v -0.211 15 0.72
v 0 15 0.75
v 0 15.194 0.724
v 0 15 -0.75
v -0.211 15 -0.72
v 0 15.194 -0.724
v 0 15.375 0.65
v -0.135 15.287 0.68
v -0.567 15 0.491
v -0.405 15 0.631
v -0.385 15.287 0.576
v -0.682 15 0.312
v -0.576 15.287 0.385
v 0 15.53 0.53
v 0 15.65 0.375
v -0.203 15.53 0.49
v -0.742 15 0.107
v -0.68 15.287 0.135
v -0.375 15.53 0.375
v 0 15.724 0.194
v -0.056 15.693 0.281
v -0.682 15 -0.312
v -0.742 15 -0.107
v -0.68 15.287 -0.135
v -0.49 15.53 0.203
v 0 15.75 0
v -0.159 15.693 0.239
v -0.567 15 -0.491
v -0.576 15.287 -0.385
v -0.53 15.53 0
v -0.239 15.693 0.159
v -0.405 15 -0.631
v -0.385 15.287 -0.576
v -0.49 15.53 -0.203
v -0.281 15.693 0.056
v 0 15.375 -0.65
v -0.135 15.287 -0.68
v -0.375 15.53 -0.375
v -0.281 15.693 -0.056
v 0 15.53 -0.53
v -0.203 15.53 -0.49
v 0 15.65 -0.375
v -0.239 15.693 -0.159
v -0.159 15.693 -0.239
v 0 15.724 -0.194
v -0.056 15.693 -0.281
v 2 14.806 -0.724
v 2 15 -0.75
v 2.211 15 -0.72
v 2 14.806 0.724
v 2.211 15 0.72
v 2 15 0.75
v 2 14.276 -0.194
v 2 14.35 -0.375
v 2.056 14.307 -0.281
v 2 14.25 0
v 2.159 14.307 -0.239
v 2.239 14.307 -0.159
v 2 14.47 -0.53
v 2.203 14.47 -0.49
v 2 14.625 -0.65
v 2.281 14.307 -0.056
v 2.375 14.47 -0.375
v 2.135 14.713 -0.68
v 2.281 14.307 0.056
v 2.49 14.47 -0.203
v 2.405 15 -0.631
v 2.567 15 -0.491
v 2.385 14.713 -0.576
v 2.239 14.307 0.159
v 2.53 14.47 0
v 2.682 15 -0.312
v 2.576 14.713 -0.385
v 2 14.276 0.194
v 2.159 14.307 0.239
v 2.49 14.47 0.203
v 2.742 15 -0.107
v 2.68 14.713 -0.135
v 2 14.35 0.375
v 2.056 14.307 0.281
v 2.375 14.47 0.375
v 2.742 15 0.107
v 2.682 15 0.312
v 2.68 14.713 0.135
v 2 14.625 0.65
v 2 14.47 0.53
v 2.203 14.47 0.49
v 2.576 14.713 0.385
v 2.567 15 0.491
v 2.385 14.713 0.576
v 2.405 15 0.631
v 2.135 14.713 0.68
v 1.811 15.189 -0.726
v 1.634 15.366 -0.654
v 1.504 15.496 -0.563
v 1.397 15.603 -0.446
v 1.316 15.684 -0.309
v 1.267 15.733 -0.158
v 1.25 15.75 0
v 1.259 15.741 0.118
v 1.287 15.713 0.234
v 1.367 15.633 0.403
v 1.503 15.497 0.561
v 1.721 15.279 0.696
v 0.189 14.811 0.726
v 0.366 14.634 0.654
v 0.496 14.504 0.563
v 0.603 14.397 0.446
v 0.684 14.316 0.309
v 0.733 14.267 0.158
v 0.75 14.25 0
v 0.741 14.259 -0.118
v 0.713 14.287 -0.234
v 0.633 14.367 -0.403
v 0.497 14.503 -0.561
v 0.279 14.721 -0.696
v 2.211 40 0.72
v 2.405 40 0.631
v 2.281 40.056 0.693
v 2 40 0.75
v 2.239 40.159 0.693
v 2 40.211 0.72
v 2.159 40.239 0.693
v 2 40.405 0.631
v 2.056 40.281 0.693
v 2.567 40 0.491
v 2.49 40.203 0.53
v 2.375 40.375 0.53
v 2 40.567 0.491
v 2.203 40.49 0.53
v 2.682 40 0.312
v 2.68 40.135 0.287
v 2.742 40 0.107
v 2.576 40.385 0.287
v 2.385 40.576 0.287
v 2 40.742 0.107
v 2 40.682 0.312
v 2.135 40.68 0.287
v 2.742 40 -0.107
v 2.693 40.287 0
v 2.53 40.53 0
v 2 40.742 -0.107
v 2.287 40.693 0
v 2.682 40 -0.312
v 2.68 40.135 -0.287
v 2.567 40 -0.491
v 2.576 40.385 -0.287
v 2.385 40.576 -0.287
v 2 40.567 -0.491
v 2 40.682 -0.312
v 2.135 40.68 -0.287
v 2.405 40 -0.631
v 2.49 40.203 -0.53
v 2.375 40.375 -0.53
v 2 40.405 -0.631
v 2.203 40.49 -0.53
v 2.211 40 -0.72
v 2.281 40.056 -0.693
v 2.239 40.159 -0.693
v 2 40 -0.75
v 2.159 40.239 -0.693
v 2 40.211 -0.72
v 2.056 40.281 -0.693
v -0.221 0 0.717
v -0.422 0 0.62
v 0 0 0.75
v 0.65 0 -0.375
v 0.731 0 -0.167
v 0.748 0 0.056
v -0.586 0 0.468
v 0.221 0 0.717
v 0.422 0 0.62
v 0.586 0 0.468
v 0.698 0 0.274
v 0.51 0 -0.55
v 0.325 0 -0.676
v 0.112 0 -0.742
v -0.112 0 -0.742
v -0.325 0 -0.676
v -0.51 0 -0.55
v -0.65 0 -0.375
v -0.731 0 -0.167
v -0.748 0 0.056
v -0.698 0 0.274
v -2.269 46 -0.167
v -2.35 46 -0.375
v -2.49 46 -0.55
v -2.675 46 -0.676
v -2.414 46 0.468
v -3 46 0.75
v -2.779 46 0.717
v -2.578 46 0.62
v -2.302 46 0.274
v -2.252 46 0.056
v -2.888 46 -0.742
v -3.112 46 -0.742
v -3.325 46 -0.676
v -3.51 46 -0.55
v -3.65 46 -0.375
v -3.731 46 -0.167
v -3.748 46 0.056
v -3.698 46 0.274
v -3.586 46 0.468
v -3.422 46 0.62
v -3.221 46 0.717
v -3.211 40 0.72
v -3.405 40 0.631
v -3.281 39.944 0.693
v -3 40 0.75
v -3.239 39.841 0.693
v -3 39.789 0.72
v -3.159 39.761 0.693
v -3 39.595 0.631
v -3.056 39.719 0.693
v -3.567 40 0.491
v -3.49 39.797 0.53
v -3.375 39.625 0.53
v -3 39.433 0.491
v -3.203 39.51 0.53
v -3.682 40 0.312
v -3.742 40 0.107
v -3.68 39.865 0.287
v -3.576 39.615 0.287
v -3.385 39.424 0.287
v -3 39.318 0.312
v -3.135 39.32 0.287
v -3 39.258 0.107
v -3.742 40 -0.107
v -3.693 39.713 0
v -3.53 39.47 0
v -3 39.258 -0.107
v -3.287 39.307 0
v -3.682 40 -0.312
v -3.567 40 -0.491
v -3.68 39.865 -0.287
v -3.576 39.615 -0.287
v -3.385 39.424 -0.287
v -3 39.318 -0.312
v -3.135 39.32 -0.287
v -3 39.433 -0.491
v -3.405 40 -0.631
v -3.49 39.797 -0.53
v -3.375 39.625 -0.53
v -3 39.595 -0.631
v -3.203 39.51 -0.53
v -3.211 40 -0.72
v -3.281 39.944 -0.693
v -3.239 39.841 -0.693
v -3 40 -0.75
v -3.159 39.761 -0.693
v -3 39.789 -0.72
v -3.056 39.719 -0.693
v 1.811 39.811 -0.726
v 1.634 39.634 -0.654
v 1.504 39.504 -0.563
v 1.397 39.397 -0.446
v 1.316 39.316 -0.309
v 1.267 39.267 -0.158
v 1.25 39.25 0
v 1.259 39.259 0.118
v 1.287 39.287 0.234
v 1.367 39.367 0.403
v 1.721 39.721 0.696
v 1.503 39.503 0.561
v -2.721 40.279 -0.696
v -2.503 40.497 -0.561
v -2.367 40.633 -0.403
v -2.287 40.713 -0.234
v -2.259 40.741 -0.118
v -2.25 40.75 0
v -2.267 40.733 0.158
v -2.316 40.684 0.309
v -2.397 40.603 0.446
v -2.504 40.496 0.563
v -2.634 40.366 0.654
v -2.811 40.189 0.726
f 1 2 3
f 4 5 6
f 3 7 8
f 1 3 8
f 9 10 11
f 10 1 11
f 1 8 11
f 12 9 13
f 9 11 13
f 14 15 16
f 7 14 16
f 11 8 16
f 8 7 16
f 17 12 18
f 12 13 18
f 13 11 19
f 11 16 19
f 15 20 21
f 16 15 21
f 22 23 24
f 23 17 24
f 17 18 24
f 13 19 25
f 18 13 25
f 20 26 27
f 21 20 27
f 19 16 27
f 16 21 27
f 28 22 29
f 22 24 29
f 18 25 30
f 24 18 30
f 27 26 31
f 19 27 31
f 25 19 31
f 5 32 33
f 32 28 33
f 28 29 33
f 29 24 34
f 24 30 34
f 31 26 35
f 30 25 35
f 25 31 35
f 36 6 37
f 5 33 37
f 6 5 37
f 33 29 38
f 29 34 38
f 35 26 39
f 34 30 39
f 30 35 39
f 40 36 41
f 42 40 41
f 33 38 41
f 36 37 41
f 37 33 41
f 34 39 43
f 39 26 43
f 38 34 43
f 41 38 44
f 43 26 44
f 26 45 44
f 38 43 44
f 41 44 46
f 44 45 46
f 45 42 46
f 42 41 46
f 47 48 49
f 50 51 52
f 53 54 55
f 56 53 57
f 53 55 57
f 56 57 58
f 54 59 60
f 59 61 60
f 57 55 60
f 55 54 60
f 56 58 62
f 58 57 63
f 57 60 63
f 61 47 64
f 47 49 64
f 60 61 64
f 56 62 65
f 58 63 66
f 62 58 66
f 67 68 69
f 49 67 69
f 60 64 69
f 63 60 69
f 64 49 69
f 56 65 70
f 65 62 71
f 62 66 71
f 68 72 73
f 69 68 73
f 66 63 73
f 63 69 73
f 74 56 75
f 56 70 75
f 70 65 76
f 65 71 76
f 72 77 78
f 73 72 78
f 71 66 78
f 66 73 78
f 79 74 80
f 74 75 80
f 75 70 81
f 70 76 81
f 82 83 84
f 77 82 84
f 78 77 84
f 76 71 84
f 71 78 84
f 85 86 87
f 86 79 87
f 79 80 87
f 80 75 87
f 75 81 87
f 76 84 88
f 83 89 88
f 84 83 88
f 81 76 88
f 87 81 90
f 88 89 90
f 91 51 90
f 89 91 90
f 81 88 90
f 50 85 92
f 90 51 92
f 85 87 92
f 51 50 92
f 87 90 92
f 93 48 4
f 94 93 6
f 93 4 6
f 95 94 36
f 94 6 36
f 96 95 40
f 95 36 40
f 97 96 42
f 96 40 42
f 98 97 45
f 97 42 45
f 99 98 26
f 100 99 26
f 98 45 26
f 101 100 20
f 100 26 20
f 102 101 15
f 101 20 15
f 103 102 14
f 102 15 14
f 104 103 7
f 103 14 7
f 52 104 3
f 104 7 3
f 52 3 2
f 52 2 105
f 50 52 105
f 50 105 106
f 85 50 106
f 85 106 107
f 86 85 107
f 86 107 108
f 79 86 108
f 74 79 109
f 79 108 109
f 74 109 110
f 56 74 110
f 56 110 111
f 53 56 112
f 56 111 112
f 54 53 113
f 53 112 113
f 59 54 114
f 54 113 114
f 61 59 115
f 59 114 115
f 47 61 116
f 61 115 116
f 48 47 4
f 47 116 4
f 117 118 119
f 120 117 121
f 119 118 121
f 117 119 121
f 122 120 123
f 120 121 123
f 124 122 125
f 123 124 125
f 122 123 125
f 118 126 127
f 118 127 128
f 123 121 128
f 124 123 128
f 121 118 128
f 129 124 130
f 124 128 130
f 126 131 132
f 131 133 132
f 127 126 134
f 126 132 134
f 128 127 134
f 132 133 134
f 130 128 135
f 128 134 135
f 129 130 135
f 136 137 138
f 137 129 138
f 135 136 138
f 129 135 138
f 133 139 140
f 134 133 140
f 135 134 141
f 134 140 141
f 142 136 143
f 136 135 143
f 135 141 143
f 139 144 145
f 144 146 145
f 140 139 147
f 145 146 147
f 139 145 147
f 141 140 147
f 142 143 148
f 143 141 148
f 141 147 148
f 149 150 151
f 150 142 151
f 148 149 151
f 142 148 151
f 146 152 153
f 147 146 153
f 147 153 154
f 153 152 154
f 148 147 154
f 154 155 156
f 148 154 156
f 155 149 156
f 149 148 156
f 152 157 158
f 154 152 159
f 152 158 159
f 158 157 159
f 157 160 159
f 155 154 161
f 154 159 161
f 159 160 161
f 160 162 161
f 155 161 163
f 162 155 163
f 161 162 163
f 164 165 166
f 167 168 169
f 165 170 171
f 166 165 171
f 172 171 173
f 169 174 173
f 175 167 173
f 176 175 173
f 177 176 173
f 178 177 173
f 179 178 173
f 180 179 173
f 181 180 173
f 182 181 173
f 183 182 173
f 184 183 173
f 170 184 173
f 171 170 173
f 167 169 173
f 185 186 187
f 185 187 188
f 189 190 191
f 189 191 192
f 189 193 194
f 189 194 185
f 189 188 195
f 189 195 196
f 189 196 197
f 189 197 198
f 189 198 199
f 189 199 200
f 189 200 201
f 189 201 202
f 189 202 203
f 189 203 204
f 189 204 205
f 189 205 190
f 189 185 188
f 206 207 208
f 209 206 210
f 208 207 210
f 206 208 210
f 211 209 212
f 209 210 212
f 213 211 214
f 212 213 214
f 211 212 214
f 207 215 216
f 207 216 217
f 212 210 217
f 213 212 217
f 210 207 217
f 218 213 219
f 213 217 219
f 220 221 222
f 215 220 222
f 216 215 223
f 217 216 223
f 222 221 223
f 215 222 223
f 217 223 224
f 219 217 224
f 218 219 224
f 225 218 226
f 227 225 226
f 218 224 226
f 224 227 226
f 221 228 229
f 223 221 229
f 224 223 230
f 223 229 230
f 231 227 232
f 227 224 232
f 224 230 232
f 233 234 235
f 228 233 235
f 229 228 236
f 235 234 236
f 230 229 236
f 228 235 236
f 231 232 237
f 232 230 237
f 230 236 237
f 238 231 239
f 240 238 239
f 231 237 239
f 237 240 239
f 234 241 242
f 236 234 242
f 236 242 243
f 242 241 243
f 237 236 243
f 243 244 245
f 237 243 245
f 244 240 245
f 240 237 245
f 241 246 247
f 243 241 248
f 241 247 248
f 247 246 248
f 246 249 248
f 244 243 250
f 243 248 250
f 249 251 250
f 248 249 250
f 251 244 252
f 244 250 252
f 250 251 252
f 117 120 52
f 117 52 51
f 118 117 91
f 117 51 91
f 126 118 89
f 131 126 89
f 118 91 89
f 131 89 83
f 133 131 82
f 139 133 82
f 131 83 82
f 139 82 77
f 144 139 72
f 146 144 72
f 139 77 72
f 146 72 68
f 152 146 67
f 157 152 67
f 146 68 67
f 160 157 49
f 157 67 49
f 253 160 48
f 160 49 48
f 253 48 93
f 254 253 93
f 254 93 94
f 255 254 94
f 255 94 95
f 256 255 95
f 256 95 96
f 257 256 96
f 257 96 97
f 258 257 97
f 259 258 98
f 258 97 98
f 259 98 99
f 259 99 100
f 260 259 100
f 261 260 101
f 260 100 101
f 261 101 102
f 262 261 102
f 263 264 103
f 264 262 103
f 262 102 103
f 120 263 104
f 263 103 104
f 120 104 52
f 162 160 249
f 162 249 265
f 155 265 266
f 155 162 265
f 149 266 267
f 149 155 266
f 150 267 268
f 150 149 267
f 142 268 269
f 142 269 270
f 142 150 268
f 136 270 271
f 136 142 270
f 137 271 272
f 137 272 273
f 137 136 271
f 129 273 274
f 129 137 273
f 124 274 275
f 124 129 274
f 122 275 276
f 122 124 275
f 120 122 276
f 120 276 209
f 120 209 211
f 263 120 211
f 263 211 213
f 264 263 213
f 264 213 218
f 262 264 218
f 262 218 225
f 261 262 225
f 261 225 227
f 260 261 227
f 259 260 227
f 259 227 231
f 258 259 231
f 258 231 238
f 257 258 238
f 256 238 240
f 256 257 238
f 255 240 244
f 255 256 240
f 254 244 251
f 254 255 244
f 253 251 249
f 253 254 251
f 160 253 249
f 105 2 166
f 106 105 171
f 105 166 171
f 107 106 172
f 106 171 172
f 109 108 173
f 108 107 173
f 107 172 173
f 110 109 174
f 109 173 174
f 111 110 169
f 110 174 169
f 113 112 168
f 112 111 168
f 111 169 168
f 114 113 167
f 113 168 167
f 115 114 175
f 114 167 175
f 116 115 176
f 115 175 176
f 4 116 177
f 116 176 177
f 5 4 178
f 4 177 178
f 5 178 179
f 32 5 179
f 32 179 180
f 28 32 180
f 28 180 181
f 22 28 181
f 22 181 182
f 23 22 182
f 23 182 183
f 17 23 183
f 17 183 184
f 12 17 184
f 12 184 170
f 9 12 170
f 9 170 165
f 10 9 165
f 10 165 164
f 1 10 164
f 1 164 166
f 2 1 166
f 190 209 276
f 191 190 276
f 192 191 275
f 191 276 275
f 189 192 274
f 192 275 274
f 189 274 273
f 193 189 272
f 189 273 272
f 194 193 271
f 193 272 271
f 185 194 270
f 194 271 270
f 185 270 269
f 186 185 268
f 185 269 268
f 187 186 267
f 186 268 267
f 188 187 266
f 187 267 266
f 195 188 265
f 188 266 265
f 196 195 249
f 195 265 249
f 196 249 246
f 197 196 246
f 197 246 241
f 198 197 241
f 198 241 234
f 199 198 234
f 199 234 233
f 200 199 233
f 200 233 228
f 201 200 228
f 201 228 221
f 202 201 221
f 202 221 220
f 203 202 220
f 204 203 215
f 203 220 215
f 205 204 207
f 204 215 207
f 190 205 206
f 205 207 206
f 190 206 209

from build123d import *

# Parameters (mm, degrees)
SKETCH_1_R      = 0.75
EXTRUDE_1_DEPTH = 15
SKETCH_3_R      = 0.75
EXTRUDE_2_DEPTH = 2
SKETCH_5_R      = 0.75
EXTRUDE_3_DEPTH = 25
SKETCH_7_R      = 0.75
EXTRUDE_4_DEPTH = 5
EXTRUDE_START   = 25
SKETCH_9_R      = 0.75
EXTRUDE_5_DEPTH = 6


with BuildPart() as part:
    # 草图1 → 凸台-拉伸1 (new body)
    with BuildSketch(Plane(origin=(0, 0, 0), x_dir=(1, 0, 0), z_dir=(0, 1, 0))):
        with Locations(Location((0, 0, 0), (0, 0, 270))):
            Circle(SKETCH_1_R)
    extrude(amount=EXTRUDE_1_DEPTH)

    # 草图2 → 旋转1 (revolve)
    with BuildSketch(Plane.XY):
        with BuildLine():
            Line((0, 15.75), (0, 14.25))
            ThreePointArc((0, 14.25), (0.75, 15), (0, 15.75))
        make_face()
    revolve(axis=Axis((0, 15.75, 0), (0, -1, 0)))

    # 草图3 → 凸台-拉伸2 (add)
    with BuildSketch(Plane(origin=(0, 0, 0), x_dir=(0, 0, -1), z_dir=(1, 0, 0))):
        with Locations((0, 15)):
            Circle(SKETCH_3_R)
    extrude(amount=EXTRUDE_2_DEPTH)

    # 草图4 → 旋转2 (revolve)
    with BuildSketch(Plane(origin=(2, 0, 0), x_dir=(0, 0, -1), z_dir=(1, 0, 0))):
        with BuildLine():
            Line((0, 15.75), (0, 14.25))
            ThreePointArc((0, 14.25), (0.75, 15), (0, 15.75))
        make_face()
    revolve(axis=Axis((2, 15.75, 0), (0, -1, 0)))

    # 草图5 → 凸台-拉伸3 (add)
    with BuildSketch(Plane(origin=(0, 15, 0), x_dir=(1, 0, 0), z_dir=(0, 1, 0))):
        with Locations(Location((2, 0, 0), (0, 0, 270))):
            Circle(SKETCH_5_R)
    extrude(amount=EXTRUDE_3_DEPTH)

    # 草图6 → 旋转3 (revolve)
    with BuildSketch(Plane(origin=(0, 40, 0), x_dir=(1, 0, 0), z_dir=(0, 1, 0))):
        with BuildLine():
            Line((2, 0.75), (2, -0.75))
            ThreePointArc((2, -0.75), (2.75, 0), (2, 0.75))
        make_face()
    revolve(axis=Axis((2, 40, -0.75), (0, 0, 1)))

    # 草图7 → 凸台-拉伸4 (add)
    with BuildSketch(Plane(origin=(2, 0, 0), x_dir=(0, 0, -1), z_dir=(1, 0, 0))):
        with Locations((0, 40)):
            Circle(SKETCH_7_R)
    extrude(amount=-EXTRUDE_4_DEPTH)

    # 草图8 → 旋转5 (revolve)
    with BuildSketch(Plane.ZY.offset(3)):
        with BuildLine():
            Line((-0.75, 40), (0.75, 40))
            ThreePointArc((0.75, 40), (0, 40.75), (-0.75, 40))
        make_face()
    revolve(axis=Axis((-3, 40, -0.75), (0, 0, 1)))

    # 草图9 → 凸台-拉伸5 (add)
    with BuildSketch(Plane(origin=(0, 15, 0), x_dir=(1, 0, 0), z_dir=(0, 1, 0)).offset(EXTRUDE_START)):
        with Locations(Location((-3, 0, 0), (0, 0, 270))):
            Circle(SKETCH_9_R)
    extrude(amount=EXTRUDE_5_DEPTH)


solid = part.part
